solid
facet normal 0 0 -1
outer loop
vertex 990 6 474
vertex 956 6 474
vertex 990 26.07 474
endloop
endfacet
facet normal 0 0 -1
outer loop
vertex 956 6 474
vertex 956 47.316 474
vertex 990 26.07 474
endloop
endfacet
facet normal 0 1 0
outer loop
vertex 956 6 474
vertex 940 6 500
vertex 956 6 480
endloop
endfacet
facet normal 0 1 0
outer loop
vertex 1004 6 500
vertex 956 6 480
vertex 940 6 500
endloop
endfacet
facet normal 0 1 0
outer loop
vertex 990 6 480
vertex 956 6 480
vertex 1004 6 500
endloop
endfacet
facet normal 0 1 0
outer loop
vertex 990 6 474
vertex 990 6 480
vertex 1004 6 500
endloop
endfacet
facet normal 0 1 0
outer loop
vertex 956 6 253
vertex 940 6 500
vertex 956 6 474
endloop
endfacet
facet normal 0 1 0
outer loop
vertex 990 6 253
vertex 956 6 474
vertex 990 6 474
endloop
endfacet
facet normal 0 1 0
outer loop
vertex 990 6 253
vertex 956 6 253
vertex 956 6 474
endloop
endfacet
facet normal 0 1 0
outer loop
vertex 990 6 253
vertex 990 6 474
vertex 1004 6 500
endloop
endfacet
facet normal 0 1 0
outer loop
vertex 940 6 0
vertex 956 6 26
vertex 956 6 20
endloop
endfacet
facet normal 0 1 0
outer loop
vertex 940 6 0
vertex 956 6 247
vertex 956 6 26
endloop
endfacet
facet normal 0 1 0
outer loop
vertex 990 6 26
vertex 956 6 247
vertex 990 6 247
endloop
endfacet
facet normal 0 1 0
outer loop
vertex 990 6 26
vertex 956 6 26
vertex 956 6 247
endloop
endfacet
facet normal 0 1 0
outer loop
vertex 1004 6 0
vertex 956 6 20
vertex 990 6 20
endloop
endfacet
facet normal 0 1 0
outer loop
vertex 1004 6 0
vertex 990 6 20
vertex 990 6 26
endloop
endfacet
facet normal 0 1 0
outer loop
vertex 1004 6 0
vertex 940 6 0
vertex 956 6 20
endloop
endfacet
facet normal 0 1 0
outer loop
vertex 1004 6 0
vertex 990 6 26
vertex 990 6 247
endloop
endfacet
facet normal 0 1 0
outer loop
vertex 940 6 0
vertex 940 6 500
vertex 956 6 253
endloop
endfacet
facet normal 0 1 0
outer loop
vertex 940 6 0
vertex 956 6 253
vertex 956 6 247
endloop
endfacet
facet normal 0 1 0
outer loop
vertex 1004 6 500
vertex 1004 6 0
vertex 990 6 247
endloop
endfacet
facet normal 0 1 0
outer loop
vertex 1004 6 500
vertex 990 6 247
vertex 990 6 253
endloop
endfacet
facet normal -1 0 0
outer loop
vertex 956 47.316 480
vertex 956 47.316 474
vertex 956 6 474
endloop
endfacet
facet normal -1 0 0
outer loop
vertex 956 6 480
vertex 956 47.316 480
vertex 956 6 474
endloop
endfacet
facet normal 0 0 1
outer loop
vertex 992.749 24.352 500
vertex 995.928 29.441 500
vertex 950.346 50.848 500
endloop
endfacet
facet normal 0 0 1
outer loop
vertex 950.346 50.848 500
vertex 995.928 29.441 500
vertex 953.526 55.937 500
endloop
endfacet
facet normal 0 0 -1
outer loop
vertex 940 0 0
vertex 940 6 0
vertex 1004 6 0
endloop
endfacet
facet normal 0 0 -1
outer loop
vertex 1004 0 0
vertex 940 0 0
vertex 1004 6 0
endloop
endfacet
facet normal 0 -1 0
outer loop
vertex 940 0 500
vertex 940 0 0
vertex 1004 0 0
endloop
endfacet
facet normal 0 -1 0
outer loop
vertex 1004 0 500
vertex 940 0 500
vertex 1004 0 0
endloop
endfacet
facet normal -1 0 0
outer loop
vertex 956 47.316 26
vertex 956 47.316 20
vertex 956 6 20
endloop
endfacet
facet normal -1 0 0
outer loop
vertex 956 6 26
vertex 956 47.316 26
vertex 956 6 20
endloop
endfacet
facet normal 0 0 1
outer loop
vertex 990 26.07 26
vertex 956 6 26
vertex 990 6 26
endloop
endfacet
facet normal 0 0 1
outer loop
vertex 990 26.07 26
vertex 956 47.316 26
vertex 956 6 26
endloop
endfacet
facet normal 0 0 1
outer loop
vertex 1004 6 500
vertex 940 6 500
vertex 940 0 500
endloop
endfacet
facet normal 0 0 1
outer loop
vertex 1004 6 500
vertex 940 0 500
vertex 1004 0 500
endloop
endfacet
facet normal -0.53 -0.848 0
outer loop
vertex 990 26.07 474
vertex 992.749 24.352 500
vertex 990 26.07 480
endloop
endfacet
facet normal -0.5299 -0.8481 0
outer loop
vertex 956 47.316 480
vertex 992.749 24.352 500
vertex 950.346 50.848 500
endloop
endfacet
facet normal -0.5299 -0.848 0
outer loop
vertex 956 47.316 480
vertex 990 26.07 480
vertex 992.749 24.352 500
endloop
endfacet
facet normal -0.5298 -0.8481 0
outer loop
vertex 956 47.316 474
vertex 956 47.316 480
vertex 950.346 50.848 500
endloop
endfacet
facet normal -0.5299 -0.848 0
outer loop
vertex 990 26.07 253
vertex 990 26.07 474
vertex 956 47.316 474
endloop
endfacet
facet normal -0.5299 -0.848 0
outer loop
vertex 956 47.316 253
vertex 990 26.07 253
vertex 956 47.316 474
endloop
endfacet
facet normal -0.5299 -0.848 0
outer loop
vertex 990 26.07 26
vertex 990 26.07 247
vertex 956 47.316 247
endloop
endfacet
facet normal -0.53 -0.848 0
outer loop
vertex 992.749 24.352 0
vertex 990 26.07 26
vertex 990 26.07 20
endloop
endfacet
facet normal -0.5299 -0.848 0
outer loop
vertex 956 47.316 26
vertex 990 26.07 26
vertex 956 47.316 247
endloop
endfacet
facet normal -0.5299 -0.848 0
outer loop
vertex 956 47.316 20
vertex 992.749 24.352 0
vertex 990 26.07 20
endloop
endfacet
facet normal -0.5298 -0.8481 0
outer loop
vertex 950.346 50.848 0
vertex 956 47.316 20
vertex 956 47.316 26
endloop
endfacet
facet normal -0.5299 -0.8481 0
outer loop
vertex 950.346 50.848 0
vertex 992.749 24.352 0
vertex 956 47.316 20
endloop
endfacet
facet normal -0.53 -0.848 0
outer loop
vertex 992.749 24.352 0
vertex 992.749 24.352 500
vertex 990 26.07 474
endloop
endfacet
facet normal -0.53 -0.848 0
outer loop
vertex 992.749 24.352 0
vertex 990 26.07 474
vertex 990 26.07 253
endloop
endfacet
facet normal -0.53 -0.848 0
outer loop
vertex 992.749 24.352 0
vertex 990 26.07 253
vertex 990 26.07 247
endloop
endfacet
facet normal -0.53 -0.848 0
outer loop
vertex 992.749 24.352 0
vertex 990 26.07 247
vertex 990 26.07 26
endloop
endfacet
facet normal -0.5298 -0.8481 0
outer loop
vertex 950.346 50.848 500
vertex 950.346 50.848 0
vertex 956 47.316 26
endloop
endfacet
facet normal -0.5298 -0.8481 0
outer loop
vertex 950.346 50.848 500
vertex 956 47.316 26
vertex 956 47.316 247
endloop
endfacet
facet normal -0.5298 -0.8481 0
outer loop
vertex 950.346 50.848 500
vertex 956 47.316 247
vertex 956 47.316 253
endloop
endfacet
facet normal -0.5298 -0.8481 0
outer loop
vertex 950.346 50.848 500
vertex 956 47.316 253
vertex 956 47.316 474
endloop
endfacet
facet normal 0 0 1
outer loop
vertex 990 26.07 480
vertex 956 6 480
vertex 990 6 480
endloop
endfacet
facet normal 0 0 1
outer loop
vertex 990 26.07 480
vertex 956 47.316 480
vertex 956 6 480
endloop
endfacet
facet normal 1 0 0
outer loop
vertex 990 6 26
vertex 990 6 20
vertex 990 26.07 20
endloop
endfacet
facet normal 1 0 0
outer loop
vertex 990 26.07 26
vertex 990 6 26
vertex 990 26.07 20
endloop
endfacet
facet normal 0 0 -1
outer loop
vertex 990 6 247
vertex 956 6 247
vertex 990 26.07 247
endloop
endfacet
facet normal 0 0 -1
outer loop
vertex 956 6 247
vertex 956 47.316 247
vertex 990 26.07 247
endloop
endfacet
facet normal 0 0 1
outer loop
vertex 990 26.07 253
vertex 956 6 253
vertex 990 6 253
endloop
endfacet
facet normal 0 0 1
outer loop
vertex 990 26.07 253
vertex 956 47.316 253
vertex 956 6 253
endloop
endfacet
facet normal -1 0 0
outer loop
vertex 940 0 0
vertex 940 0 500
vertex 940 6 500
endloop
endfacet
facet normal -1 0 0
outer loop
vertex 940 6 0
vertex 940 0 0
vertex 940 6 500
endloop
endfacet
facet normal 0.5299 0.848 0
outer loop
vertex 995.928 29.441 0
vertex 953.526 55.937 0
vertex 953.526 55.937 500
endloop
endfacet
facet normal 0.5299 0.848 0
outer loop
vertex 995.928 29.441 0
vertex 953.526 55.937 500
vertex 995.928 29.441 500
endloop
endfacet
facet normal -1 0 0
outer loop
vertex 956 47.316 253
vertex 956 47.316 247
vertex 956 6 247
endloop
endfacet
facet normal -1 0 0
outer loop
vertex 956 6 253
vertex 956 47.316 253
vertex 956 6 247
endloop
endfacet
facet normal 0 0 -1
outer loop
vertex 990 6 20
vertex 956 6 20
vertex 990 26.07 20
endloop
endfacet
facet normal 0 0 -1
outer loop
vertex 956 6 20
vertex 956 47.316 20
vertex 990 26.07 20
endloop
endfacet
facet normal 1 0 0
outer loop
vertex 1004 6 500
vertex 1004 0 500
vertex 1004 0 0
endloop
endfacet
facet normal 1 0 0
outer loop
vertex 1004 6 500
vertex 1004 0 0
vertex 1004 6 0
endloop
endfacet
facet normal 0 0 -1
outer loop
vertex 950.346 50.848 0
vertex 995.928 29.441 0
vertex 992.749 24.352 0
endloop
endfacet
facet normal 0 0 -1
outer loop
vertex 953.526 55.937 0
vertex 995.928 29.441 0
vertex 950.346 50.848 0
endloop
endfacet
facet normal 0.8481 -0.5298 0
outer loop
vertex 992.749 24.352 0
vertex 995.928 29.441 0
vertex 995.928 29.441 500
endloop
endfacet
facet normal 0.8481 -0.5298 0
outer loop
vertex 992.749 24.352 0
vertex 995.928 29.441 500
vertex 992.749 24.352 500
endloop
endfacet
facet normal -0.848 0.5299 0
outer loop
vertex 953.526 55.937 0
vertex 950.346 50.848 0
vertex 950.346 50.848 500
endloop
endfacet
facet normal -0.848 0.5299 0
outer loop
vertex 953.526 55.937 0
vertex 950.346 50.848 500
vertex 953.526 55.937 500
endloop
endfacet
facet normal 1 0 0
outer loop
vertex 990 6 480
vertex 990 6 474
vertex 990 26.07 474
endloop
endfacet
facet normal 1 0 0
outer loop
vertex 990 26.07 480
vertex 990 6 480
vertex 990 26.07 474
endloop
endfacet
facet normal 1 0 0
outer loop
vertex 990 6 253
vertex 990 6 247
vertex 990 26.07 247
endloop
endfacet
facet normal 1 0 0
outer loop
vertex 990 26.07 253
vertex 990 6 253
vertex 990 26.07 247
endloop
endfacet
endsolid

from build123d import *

# Parameters (mm, degrees)
SKETCH_1_W                      = 64
SKETCH_1_H                      = 6
BASE_PLATE_940_TO_1004_T6_DEPTH = 500
INCLINED_BEARING_PLATE_T6_DEPTH = 500
TOE_WEB_1_T6_START              = 20
TOE_WEB_1_T6_DEPTH              = 6
TOE_WEB_2_T6_START              = 247
TOE_WEB_2_T6_DEPTH              = 6
TOE_WEB_3_T6_START              = 474
TOE_WEB_3_T6_DEPTH              = 6


with BuildPart() as part:
    # 草图1 → Base_plate_940_to_1004_t6 (new body)
    with BuildSketch(Plane.XY):
        with Locations((972, 3)):
            Rectangle(SKETCH_1_W, SKETCH_1_H)
    extrude(amount=BASE_PLATE_940_TO_1004_T6_DEPTH)



with BuildPart() as body_2:
    # 草图2 → Inclined_bearing_plate_t6 (new body)
    with BuildSketch(Plane.XY):
        Polygon((953.526014292, 55.936634693), (995.928419099, 29.440671481), (992.748903514, 24.352382904), (950.346498706, 50.848346116), align=None)
    extrude(amount=INCLINED_BEARING_PLATE_T6_DEPTH)


with BuildPart() as part_1:
    add(part.part)

    add(body_2.part)  # Toe_web_1_t6 merges body 2
    # 草图3 → Toe_web_1_t6 (add)
    with BuildSketch(Plane.XY.offset(TOE_WEB_1_T6_START)):
        Polygon((956, 6), (990, 6), (990, 26.070088461), (956, 47.315646426), align=None)
    extrude(amount=TOE_WEB_1_T6_DEPTH)

    # 草图4 → Toe_web_2_t6 (add)
    with BuildSketch(Plane.XY.offset(TOE_WEB_2_T6_START)):
        Polygon((956, 6), (990, 6), (990, 26.070088461), (956, 47.315646426), align=None)
    extrude(amount=TOE_WEB_2_T6_DEPTH)

    # 草图5 → Toe_web_3_t6 (add)
    with BuildSketch(Plane.XY.offset(TOE_WEB_3_T6_START)):
        Polygon((956, 6), (990, 6), (990, 26.070088461), (956, 47.315646426), align=None)
    extrude(amount=TOE_WEB_3_T6_DEPTH)


solid = part_1.part
